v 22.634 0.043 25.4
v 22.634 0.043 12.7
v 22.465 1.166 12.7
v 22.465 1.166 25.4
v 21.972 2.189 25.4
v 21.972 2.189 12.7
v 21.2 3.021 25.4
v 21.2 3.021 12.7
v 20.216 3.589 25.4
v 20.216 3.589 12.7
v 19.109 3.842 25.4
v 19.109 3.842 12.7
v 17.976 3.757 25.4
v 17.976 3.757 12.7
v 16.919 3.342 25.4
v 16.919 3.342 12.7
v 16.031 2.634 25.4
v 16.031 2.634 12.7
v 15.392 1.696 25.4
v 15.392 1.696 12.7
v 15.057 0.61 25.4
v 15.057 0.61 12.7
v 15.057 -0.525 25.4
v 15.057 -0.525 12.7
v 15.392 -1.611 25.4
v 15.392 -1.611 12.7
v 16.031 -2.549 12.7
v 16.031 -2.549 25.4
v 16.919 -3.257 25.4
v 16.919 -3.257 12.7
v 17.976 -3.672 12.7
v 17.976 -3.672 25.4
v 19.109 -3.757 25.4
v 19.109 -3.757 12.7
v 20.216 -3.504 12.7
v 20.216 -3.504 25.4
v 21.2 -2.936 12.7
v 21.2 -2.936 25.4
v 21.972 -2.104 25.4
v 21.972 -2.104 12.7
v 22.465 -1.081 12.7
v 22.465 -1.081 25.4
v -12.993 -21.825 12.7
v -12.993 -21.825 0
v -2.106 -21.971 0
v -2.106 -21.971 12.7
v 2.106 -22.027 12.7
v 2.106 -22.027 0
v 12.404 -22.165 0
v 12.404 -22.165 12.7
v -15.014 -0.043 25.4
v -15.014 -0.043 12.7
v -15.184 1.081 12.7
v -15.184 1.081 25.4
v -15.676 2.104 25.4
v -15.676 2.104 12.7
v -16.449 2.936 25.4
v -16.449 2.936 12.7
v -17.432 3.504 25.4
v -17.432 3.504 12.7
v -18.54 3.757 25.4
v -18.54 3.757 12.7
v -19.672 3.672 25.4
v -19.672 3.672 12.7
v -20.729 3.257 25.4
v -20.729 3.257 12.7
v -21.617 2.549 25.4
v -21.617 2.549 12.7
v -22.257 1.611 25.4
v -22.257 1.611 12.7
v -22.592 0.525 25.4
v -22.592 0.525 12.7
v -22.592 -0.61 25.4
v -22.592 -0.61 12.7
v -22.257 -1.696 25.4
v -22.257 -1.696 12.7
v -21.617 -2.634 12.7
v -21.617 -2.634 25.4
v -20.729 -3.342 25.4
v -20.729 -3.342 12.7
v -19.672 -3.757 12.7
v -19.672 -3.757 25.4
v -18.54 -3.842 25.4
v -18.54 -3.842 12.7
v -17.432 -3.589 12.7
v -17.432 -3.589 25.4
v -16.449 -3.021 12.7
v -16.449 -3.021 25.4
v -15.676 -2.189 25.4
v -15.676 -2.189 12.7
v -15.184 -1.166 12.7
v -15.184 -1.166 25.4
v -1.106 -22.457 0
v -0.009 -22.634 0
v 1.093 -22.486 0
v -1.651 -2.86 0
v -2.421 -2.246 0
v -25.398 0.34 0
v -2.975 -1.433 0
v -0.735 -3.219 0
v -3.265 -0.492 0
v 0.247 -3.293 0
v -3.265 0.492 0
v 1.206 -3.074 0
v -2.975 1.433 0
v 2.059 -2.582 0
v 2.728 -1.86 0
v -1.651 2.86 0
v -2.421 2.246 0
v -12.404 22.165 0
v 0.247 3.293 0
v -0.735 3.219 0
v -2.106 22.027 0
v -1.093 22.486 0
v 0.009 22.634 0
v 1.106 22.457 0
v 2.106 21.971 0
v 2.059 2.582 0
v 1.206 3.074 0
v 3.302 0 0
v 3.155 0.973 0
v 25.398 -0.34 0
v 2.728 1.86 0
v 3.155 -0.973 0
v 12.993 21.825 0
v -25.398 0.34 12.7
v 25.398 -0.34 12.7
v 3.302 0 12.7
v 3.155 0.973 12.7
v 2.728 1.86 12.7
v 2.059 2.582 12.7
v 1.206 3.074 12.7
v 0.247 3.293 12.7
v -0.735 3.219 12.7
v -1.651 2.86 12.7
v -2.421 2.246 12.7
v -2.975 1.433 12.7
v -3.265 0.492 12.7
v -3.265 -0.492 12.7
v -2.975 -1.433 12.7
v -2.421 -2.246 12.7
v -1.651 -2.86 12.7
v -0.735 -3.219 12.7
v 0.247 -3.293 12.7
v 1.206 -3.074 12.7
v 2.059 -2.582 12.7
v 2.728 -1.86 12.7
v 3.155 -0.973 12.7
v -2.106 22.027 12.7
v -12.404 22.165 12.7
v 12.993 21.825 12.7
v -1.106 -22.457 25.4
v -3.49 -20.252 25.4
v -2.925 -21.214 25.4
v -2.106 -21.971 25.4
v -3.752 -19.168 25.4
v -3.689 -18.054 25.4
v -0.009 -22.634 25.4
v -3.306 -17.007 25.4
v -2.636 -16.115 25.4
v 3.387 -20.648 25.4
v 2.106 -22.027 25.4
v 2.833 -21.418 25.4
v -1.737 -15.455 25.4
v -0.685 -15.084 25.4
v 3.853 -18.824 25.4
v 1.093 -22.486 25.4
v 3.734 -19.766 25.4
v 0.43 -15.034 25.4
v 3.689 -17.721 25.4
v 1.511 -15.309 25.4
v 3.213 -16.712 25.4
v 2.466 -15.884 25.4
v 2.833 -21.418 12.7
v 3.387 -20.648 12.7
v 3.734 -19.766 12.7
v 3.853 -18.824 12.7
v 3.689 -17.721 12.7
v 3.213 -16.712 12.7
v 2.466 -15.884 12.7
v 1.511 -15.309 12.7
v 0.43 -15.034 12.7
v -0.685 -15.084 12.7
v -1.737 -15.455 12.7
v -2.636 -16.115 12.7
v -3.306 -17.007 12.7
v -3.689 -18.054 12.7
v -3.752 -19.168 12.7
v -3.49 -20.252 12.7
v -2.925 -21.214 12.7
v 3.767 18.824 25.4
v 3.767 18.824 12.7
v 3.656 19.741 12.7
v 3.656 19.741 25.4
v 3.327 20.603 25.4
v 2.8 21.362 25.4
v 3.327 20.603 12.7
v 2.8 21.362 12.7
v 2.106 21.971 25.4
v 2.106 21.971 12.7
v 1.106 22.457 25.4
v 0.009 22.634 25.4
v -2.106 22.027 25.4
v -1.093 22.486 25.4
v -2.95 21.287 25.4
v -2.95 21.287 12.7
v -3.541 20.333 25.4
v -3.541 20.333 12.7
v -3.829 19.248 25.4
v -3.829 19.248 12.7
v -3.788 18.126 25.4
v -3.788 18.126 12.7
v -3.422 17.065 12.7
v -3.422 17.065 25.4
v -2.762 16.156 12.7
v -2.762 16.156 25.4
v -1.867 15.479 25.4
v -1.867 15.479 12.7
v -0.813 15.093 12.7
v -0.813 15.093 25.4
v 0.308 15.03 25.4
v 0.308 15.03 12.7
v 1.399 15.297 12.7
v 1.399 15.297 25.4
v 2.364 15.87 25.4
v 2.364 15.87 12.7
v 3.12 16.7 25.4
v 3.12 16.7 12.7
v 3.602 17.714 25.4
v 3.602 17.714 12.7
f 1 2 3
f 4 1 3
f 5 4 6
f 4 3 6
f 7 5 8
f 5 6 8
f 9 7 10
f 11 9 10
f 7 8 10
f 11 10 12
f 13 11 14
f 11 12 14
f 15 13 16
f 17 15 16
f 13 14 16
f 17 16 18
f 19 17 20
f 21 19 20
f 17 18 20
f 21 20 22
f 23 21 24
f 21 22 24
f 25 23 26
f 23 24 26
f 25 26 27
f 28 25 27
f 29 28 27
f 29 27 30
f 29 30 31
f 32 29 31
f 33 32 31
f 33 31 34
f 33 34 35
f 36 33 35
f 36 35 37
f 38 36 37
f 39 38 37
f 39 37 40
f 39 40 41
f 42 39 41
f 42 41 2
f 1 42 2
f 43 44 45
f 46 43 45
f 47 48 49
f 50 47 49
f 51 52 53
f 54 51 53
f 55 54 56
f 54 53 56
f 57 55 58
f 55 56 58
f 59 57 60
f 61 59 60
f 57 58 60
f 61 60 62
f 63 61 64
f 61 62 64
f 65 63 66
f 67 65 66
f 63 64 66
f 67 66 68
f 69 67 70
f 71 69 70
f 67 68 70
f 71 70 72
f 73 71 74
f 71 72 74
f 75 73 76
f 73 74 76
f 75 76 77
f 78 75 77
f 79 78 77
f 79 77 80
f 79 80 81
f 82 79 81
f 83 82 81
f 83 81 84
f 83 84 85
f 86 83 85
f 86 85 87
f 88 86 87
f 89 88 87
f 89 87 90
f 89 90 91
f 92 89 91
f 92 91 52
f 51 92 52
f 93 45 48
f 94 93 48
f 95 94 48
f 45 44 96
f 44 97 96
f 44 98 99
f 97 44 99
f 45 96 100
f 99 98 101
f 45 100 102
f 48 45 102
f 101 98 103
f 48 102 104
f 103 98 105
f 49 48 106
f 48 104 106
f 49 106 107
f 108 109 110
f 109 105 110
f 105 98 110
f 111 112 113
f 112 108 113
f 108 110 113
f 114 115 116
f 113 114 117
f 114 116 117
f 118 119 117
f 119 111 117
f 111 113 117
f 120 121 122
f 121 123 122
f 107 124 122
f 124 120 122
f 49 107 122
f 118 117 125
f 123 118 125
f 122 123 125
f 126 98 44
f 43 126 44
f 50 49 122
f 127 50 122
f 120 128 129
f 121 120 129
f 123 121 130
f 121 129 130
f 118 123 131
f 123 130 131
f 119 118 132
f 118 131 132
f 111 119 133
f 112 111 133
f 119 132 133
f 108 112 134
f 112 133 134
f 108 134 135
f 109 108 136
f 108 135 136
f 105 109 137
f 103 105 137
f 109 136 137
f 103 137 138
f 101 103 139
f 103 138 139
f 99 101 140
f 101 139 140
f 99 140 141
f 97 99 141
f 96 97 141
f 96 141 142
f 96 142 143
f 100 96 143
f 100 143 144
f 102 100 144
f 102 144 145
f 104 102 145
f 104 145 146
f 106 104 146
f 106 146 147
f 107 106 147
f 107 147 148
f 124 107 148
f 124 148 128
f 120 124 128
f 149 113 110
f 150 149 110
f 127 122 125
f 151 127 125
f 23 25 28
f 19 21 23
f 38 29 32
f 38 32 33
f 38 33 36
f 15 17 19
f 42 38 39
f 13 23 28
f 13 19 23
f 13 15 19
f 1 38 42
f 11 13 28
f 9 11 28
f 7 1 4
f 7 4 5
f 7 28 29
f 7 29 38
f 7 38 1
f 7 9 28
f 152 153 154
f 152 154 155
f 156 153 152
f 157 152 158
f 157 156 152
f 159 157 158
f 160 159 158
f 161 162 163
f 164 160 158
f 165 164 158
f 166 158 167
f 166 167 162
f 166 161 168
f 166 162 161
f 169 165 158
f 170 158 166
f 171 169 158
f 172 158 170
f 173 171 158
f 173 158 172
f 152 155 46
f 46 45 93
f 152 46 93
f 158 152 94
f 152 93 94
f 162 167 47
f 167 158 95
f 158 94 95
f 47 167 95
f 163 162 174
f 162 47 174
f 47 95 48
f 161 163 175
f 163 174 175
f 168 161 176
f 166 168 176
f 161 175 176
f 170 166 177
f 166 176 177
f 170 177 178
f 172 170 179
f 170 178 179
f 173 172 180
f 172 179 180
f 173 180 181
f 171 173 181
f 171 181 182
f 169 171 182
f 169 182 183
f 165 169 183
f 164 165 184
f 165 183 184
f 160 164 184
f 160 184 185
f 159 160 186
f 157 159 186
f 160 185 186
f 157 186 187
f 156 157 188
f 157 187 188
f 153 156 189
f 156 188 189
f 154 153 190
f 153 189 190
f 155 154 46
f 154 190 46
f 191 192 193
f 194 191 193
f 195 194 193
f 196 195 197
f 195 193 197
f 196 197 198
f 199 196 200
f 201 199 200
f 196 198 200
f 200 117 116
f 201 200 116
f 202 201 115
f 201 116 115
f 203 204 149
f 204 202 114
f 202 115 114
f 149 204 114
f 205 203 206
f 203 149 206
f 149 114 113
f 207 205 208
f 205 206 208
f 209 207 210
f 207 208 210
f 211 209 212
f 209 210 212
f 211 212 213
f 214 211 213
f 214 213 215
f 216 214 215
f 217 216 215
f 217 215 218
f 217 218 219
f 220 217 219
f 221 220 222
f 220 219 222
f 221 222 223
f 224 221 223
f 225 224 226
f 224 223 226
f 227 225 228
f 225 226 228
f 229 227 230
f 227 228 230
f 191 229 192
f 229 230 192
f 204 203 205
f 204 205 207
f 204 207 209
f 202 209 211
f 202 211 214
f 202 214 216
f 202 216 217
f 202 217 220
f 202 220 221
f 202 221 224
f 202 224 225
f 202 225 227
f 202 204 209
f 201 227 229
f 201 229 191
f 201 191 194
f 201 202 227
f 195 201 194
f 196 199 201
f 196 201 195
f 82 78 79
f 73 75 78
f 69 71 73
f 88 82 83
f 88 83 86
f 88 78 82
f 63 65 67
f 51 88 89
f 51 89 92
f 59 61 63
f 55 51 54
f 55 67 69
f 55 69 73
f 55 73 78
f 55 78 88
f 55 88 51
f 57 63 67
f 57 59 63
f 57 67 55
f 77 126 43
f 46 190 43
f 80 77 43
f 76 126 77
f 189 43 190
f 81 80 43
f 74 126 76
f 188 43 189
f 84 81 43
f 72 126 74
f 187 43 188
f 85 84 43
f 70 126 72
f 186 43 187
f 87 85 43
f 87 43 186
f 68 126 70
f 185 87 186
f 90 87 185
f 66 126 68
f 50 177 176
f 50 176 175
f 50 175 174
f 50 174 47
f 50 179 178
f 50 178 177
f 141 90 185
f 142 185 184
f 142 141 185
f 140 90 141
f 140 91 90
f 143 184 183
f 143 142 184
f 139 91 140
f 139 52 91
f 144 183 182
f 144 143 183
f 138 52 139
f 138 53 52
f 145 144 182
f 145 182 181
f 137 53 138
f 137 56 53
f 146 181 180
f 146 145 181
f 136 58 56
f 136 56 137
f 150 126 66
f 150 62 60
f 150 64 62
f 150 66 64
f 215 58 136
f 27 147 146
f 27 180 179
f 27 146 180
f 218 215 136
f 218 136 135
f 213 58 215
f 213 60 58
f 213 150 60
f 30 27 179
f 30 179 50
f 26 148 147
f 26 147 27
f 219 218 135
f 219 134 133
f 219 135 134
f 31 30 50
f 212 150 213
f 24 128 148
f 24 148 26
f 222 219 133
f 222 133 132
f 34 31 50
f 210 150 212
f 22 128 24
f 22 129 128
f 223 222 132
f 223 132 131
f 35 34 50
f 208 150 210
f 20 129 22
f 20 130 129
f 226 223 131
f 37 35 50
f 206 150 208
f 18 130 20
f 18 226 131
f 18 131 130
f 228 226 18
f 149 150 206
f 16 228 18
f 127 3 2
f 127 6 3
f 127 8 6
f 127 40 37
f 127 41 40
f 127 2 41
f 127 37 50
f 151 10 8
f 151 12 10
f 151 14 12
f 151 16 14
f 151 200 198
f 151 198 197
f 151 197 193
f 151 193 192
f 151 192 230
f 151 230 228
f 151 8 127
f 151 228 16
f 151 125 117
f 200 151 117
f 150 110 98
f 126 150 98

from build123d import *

# Parameters (mm, degrees)
F0_R     = 3.81
F1_DEPTH = 12.7
F2_R     = 3.302
F3_DEPTH = 25.4
F4_DEPTH = 25.4


# Not quite as in the source:
# - a feature names something its author has since deleted; it is built from what else it names


with BuildPart() as f1:
    # F0 (on Top) → F1 (new body)
    with BuildSketch(Plane.XY):
        with BuildLine():
            Line((2.1058679478, -22.0272163702), (12.4043320804, -22.1651200231))
            Line((12.4043320804, -22.1651200231), (25.3977230582, -0.3400933129))
            Line((25.3977230582, -0.3400933129), (12.9933909777, 21.8250267102))
            Line((12.9933909777, 21.8250267102), (2.1058679478, 21.9708182746))
            ThreePointArc((2.1058679478, 21.9708182746), (3.3265702822, 20.6034553453), (3.7674883359, 18.8243019401))
            ThreePointArc((3.7674883359, 18.8243019401), (-1.8666159044, 15.4793439852), (-2.1058679478, 22.0272163702))
            Line((-2.1058679478, 22.0272163702), (-12.4043320804, 22.1651200231))
            Line((-12.4043320804, 22.1651200231), (-25.3977230582, 0.3400933129))
            Line((-25.3977230582, 0.3400933129), (-12.9933909777, -21.8250267102))
            Line((-12.9933909777, -21.8250267102), (-2.1058679478, -21.9708182746))
            ThreePointArc((-2.1058679478, -21.9708182746), (-1.7366417411, -15.4552199938), (3.8525116641, -18.8243019401))
            ThreePointArc((3.8525116641, -18.8243019401), (3.3874696191, -20.6484061804), (2.1058679478, -22.0272163702))
        make_face()
        with Locations((-18.8243019401, -0.0425116641)):
            Circle(F0_R, mode=Mode.SUBTRACT)
        with Locations((18.8243019401, 0.0425116641)):
            Circle(F0_R, mode=Mode.SUBTRACT)
        with BuildLine():
            ThreePointArc((-2.1058679478, -21.9708182746), (-0.0085023328, -22.6339603988), (2.1058679478, -22.0272163702))
            Line((2.1058679478, -22.0272163702), (-2.1058679478, -21.9708182746))
        make_face()
        with BuildLine():
            Line((-2.1058679478, -21.9708182746), (2.1058679478, -22.0272163702))
            ThreePointArc((2.1058679478, -22.0272163702), (3.3874696191, -20.6484061804), (3.8525116641, -18.8243019401))
            ThreePointArc((3.8525116641, -18.8243019401), (-1.7366417411, -15.4552199938), (-2.1058679478, -21.9708182746))
        make_face()
        with BuildLine():
            ThreePointArc((3.7674883359, 18.8243019401), (3.3265702822, 20.6034553453), (2.1058679478, 21.9708182746))
            Line((2.1058679478, 21.9708182746), (-2.1058679478, 22.0272163702))
            ThreePointArc((-2.1058679478, 22.0272163702), (-1.8666159044, 15.4793439852), (3.7674883359, 18.8243019401))
        make_face()
        with BuildLine():
            Line((-2.1058679478, 22.0272163702), (2.1058679478, 21.9708182746))
            ThreePointArc((2.1058679478, 21.9708182746), (0.0085023328, 22.6339603988), (-2.1058679478, 22.0272163702))
        make_face()
    extrude(amount=F1_DEPTH)

    # F2 (on face) → F3 (cut)
    with BuildSketch(Plane.XY.offset(12.7)):
        Circle(F2_R)
    extrude(amount=-F3_DEPTH, mode=Mode.SUBTRACT)

    # F0 (on Top) → F4 (join)
    with BuildSketch(Plane.XY):
        with BuildLine():
            Line((-2.1058679478, 22.0272163702), (2.1058679478, 21.9708182746))
            ThreePointArc((2.1058679478, 21.9708182746), (0.0085023328, 22.6339603988), (-2.1058679478, 22.0272163702))
        make_face()
        with BuildLine():
            ThreePointArc((3.7674883359, 18.8243019401), (3.3265702822, 20.6034553453), (2.1058679478, 21.9708182746))
            Line((2.1058679478, 21.9708182746), (-2.1058679478, 22.0272163702))
            ThreePointArc((-2.1058679478, 22.0272163702), (-1.8666159044, 15.4793439852), (3.7674883359, 18.8243019401))
        make_face()
        with Locations((18.8243019401, 0.0425116641)):
            Circle(F0_R)
        with BuildLine():
            ThreePointArc((-2.1058679478, -21.9708182746), (-0.0085023328, -22.6339603988), (2.1058679478, -22.0272163702))
            Line((2.1058679478, -22.0272163702), (-2.1058679478, -21.9708182746))
        make_face()
        with BuildLine():
            Line((-2.1058679478, -21.9708182746), (2.1058679478, -22.0272163702))
            ThreePointArc((2.1058679478, -22.0272163702), (3.3874696191, -20.6484061804), (3.8525116641, -18.8243019401))
            ThreePointArc((3.8525116641, -18.8243019401), (-1.7366417411, -15.4552199938), (-2.1058679478, -21.9708182746))
        make_face()
        with Locations((-18.8243019401, -0.0425116641)):
            Circle(F0_R)
    extrude(amount=F4_DEPTH)


solid = f1.part
